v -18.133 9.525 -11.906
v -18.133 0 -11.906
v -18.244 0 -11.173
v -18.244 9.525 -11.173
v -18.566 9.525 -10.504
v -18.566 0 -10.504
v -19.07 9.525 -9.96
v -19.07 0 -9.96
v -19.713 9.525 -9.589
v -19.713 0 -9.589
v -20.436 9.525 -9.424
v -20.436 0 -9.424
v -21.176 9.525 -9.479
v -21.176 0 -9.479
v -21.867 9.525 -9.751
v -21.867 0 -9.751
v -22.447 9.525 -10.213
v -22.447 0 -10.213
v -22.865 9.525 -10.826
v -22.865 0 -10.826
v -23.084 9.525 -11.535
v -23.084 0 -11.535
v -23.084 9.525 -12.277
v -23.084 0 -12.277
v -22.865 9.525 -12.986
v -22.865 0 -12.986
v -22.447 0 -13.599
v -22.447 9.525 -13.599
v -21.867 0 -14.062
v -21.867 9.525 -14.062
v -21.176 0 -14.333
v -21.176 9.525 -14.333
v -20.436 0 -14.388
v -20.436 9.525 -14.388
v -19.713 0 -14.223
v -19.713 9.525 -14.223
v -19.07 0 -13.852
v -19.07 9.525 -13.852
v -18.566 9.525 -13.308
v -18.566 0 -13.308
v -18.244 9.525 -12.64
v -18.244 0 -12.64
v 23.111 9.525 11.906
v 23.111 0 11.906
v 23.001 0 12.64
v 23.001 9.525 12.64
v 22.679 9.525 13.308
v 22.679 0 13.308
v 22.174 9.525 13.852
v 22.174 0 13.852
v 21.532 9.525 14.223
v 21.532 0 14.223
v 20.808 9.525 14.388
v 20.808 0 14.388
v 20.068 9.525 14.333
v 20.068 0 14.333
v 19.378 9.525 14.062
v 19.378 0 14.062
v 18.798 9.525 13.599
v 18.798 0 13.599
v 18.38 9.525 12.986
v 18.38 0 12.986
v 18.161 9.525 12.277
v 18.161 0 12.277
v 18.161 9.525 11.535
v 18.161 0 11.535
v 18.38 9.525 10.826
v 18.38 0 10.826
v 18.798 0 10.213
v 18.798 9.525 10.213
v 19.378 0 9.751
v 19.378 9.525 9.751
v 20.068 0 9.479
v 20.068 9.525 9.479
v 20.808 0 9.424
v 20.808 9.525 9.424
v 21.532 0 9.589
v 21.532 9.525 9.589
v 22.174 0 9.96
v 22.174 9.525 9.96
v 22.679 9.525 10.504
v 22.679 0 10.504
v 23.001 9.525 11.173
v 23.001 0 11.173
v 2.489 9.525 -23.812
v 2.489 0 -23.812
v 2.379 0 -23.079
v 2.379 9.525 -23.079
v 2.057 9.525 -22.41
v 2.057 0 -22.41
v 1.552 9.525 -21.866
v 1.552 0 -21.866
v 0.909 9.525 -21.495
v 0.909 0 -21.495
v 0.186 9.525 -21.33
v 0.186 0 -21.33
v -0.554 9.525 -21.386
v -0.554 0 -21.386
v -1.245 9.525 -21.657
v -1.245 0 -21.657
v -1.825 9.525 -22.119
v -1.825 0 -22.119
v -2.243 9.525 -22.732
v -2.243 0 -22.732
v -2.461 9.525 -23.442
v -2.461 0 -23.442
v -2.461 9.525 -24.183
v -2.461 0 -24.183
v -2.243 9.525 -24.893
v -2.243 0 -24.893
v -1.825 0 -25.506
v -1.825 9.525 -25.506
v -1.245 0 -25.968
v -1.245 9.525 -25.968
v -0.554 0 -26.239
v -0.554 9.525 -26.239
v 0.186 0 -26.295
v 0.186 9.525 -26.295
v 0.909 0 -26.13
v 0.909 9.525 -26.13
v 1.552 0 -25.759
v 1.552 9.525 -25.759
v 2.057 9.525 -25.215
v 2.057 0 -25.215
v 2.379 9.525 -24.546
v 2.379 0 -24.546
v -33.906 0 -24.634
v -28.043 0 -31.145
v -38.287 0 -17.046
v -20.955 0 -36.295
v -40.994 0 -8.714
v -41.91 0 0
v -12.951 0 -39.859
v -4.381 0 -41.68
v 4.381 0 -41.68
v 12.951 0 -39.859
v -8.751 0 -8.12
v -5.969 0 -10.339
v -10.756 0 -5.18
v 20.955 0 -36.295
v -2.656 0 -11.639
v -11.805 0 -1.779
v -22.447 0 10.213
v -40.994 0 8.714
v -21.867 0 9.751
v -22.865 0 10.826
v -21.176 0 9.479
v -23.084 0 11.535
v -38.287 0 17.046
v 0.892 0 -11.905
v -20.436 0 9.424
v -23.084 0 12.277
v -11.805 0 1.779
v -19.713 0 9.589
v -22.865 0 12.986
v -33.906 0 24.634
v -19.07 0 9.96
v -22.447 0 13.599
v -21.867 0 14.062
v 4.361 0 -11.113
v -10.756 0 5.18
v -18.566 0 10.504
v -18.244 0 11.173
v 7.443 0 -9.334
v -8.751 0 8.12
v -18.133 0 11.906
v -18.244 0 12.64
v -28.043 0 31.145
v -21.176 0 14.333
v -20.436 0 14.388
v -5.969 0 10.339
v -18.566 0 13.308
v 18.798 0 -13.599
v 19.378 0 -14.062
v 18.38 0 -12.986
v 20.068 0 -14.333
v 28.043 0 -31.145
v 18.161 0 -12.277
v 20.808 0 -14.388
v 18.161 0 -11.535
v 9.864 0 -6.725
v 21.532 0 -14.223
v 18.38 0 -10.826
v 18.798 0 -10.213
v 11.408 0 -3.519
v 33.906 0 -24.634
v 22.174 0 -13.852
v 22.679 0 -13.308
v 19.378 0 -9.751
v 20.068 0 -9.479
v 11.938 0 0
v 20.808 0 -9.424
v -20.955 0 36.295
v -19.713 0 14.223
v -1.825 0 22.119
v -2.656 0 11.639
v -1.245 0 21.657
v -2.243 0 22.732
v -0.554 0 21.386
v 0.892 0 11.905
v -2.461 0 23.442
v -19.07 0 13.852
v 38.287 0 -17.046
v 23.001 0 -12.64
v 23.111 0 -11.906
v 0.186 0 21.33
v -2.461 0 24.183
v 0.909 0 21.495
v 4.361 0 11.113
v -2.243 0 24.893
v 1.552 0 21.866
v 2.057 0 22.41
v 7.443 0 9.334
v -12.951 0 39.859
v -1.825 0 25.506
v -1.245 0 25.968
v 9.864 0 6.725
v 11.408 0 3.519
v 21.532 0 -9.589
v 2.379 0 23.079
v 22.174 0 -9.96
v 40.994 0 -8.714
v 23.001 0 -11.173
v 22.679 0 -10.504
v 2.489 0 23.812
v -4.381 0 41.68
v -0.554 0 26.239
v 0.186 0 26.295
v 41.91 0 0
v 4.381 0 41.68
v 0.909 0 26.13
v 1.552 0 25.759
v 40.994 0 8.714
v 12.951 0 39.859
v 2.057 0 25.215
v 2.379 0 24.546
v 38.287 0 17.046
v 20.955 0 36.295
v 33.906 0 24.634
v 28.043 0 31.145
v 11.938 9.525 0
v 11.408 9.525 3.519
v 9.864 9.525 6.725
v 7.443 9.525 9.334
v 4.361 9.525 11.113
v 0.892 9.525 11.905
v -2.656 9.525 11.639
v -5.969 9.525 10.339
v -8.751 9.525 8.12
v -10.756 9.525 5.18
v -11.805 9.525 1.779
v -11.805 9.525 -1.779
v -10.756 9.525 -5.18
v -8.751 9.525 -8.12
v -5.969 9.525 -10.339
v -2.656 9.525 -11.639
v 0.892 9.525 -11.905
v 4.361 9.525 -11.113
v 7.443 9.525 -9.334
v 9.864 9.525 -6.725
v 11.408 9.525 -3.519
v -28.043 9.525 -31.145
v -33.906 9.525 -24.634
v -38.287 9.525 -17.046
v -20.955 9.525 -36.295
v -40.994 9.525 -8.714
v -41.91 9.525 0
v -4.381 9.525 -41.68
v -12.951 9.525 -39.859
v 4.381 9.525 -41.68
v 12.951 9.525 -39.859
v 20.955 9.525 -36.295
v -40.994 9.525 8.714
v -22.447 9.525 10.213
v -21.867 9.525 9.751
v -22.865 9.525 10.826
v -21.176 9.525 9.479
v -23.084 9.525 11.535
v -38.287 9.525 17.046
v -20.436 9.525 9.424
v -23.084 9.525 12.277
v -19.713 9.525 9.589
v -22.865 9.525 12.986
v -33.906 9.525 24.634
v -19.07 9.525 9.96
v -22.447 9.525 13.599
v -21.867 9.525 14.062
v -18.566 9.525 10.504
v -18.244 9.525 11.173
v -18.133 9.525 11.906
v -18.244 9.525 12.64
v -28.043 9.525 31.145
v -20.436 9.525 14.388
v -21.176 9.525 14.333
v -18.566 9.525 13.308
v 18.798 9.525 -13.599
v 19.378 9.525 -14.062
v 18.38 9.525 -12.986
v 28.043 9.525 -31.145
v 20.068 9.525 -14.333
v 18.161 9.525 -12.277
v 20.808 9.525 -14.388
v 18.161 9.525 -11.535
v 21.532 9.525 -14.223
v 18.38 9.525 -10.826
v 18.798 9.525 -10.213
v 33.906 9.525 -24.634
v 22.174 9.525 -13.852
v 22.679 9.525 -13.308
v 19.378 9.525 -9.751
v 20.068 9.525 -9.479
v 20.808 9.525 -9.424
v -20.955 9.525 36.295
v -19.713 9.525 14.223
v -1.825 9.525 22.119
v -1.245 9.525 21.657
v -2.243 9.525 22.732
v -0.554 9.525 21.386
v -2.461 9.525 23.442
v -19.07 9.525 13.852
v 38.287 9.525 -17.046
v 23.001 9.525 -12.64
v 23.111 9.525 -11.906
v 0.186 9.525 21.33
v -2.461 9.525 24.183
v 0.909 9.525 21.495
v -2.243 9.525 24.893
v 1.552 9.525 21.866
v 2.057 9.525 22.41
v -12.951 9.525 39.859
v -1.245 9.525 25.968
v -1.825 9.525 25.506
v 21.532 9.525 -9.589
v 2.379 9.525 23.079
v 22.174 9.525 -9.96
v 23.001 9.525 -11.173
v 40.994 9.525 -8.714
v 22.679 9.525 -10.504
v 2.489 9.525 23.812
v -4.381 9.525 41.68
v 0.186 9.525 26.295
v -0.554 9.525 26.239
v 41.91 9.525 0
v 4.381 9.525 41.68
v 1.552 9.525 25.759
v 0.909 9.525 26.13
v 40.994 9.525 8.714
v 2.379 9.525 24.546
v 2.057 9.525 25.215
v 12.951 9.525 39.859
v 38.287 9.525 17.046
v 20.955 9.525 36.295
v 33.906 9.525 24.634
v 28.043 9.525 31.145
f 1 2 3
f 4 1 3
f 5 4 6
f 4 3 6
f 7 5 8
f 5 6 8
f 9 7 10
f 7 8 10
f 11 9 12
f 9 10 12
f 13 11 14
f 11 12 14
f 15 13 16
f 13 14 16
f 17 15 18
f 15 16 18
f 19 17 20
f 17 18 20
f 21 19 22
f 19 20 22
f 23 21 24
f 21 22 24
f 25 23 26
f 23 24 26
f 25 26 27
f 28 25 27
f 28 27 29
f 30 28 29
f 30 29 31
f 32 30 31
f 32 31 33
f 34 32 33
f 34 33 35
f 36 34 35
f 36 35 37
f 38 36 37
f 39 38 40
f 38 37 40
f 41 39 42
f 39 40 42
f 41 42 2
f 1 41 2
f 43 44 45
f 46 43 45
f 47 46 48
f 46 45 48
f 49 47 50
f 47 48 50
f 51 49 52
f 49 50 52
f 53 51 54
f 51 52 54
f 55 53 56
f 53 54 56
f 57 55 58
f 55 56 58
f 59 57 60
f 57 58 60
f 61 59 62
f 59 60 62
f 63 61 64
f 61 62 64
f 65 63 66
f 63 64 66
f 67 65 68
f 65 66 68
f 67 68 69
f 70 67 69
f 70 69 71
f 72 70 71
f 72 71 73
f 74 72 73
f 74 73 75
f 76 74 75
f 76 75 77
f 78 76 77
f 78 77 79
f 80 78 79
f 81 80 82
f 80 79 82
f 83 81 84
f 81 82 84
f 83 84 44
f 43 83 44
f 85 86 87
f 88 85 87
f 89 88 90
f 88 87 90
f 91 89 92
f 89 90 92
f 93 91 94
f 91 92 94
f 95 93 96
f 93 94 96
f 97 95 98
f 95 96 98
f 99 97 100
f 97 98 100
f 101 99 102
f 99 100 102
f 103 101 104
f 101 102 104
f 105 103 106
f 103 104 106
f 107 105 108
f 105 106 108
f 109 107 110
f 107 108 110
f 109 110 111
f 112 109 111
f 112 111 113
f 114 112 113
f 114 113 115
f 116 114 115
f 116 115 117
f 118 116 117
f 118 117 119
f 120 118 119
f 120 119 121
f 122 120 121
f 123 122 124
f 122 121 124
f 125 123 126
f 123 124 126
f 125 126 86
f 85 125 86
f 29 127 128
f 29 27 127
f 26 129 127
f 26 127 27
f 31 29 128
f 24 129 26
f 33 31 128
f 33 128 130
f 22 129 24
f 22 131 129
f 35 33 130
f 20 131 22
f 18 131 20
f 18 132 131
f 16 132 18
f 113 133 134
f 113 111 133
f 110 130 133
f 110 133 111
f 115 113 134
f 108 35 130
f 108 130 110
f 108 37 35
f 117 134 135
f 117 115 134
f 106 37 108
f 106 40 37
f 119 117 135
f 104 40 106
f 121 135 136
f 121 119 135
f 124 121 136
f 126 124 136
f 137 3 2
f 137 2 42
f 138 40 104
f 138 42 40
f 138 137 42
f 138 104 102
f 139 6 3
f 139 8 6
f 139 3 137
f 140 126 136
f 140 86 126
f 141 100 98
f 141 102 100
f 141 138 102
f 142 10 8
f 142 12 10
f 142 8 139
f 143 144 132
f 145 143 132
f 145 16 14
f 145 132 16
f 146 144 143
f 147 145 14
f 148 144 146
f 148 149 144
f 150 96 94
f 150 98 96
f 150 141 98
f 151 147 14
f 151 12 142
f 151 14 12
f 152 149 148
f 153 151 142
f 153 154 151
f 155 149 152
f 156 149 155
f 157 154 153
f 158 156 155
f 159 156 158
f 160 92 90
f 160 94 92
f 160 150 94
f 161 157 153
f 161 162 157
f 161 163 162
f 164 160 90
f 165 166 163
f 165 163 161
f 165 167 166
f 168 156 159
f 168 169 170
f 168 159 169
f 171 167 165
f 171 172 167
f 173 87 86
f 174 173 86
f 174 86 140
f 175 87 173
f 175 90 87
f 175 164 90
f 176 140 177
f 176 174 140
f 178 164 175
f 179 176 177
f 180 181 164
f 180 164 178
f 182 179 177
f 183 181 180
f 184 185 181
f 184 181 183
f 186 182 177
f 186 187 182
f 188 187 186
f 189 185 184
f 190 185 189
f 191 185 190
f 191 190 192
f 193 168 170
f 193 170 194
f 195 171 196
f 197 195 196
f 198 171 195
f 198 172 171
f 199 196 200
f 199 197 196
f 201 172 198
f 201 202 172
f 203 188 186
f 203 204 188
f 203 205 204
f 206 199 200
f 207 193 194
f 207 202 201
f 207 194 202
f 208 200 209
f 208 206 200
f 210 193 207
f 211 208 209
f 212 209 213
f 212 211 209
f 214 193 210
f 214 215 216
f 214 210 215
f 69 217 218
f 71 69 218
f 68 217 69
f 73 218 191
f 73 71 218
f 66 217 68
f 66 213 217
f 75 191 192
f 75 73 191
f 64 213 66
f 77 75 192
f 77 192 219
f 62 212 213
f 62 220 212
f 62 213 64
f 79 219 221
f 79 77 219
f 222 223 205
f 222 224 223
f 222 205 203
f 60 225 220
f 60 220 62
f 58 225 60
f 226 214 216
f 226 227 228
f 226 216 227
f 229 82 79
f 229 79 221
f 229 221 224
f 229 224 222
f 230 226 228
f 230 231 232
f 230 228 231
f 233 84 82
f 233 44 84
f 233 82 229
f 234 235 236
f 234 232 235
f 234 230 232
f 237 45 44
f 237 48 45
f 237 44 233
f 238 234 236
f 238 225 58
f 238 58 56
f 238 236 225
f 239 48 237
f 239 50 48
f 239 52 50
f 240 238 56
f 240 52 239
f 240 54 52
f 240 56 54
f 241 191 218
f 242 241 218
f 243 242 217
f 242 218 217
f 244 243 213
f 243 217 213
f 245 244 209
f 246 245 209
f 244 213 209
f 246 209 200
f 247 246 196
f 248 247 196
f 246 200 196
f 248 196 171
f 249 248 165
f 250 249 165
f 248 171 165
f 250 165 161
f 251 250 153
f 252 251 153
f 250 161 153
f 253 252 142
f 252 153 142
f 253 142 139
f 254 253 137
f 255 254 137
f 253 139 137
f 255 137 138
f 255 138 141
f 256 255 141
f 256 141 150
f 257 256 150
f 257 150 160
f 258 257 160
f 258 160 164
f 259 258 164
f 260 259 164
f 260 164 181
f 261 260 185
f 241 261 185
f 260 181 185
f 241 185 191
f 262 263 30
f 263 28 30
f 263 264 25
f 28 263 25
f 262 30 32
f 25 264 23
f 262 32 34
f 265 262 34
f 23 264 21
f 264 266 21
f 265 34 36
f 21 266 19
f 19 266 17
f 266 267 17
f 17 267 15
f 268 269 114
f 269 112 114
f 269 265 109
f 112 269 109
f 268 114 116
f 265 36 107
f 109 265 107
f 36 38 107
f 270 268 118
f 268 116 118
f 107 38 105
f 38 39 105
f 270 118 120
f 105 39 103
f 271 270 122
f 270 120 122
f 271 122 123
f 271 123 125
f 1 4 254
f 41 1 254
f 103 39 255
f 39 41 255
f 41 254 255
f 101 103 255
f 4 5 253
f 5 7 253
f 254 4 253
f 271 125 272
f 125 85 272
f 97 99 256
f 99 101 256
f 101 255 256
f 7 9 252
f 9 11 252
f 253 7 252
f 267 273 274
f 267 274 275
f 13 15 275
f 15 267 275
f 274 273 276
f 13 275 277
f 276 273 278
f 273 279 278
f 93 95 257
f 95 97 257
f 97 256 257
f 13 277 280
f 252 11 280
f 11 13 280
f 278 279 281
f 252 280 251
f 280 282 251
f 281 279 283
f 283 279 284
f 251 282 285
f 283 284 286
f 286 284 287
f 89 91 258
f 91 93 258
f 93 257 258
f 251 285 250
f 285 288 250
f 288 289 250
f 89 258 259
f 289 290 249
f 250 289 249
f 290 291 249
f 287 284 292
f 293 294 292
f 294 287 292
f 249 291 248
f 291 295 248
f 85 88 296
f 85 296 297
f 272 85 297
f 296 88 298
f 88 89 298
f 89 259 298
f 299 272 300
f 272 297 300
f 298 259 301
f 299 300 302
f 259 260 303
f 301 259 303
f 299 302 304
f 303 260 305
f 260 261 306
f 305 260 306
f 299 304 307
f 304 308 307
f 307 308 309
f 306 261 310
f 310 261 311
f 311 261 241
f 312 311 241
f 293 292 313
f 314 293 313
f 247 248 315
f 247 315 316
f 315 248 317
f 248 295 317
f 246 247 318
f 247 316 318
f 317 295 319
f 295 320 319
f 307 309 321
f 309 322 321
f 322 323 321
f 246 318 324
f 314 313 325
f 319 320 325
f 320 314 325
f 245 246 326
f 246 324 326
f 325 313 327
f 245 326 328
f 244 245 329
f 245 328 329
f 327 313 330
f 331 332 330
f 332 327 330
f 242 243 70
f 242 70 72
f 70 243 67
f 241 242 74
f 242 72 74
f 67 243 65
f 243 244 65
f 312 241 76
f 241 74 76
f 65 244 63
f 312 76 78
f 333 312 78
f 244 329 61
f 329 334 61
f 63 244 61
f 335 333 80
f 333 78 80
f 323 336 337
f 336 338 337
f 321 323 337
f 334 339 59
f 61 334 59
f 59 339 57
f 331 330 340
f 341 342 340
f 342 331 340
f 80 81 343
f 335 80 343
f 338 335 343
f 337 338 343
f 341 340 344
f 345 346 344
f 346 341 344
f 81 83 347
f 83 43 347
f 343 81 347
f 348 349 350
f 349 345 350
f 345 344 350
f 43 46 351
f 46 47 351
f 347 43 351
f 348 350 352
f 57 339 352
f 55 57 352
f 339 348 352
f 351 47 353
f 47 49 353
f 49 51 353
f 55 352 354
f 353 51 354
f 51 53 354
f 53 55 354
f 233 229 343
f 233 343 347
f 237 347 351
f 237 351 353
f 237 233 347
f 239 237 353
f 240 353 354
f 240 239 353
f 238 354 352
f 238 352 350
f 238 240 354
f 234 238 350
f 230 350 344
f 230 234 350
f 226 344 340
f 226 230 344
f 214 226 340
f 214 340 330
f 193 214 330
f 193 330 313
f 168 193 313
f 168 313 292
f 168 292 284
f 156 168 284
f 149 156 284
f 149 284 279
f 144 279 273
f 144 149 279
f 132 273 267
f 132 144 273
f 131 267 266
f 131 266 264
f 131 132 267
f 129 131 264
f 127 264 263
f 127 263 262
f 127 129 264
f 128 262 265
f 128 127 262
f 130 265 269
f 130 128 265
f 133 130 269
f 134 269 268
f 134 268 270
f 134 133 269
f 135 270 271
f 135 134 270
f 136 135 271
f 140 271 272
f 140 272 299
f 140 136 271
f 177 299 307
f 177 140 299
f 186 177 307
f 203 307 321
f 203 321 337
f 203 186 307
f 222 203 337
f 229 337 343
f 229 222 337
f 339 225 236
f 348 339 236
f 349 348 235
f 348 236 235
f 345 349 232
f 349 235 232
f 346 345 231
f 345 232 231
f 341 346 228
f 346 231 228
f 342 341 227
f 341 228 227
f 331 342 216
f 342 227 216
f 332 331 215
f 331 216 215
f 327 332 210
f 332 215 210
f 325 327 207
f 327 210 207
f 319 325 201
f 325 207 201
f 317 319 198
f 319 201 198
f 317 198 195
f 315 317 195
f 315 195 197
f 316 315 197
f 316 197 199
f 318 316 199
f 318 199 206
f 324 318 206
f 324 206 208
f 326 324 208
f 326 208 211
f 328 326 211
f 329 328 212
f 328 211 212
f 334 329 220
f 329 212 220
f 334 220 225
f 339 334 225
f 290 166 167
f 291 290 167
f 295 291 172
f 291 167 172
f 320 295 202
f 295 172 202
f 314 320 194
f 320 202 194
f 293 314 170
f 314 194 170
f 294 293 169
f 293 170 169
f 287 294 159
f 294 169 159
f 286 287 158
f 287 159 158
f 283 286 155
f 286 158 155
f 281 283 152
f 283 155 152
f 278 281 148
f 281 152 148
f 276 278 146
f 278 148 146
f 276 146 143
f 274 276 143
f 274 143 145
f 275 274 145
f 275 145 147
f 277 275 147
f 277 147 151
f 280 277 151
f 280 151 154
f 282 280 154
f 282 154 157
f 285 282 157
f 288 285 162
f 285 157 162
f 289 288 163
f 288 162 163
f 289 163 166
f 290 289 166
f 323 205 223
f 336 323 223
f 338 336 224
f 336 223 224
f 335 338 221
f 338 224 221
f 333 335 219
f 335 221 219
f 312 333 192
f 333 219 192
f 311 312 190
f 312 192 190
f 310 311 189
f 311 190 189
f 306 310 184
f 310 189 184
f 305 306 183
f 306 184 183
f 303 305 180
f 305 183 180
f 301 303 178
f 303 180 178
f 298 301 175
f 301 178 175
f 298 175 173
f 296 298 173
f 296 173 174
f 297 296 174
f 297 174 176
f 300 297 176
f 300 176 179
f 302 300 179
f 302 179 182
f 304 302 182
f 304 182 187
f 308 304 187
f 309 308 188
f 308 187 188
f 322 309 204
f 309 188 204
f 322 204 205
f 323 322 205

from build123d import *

# Parameters (mm, degrees)
SKETCH1_R           = 41.91
SKETCH1_R_2         = 2.4892
SKETCH1_R_3         = 11.938
BOSS_EXTRUDE1_DEPTH = 9.525


with BuildPart() as part:
    # Sketch1 → Boss-Extrude1 (new body)
    with BuildSketch(Plane.XZ):
        Circle(SKETCH1_R)
        with Locations((-20.622229928, -11.90625)):
            Circle(SKETCH1_R_2, mode=Mode.SUBTRACT)
        with Locations((-20.622229928, 11.90625)):
            Circle(SKETCH1_R_2, mode=Mode.SUBTRACT)
        with Locations((0, 23.8125)):
            Circle(SKETCH1_R_2, mode=Mode.SUBTRACT)
        with Locations((20.622229928, 11.90625)):
            Circle(SKETCH1_R_2, mode=Mode.SUBTRACT)
        with Locations((20.622229928, -11.90625)):
            Circle(SKETCH1_R_2, mode=Mode.SUBTRACT)
        Circle(SKETCH1_R_3, mode=Mode.SUBTRACT)
        with Locations((0, -23.8125)):
            Circle(SKETCH1_R_2, mode=Mode.SUBTRACT)
    extrude(amount=-BOSS_EXTRUDE1_DEPTH)


solid = part.part
